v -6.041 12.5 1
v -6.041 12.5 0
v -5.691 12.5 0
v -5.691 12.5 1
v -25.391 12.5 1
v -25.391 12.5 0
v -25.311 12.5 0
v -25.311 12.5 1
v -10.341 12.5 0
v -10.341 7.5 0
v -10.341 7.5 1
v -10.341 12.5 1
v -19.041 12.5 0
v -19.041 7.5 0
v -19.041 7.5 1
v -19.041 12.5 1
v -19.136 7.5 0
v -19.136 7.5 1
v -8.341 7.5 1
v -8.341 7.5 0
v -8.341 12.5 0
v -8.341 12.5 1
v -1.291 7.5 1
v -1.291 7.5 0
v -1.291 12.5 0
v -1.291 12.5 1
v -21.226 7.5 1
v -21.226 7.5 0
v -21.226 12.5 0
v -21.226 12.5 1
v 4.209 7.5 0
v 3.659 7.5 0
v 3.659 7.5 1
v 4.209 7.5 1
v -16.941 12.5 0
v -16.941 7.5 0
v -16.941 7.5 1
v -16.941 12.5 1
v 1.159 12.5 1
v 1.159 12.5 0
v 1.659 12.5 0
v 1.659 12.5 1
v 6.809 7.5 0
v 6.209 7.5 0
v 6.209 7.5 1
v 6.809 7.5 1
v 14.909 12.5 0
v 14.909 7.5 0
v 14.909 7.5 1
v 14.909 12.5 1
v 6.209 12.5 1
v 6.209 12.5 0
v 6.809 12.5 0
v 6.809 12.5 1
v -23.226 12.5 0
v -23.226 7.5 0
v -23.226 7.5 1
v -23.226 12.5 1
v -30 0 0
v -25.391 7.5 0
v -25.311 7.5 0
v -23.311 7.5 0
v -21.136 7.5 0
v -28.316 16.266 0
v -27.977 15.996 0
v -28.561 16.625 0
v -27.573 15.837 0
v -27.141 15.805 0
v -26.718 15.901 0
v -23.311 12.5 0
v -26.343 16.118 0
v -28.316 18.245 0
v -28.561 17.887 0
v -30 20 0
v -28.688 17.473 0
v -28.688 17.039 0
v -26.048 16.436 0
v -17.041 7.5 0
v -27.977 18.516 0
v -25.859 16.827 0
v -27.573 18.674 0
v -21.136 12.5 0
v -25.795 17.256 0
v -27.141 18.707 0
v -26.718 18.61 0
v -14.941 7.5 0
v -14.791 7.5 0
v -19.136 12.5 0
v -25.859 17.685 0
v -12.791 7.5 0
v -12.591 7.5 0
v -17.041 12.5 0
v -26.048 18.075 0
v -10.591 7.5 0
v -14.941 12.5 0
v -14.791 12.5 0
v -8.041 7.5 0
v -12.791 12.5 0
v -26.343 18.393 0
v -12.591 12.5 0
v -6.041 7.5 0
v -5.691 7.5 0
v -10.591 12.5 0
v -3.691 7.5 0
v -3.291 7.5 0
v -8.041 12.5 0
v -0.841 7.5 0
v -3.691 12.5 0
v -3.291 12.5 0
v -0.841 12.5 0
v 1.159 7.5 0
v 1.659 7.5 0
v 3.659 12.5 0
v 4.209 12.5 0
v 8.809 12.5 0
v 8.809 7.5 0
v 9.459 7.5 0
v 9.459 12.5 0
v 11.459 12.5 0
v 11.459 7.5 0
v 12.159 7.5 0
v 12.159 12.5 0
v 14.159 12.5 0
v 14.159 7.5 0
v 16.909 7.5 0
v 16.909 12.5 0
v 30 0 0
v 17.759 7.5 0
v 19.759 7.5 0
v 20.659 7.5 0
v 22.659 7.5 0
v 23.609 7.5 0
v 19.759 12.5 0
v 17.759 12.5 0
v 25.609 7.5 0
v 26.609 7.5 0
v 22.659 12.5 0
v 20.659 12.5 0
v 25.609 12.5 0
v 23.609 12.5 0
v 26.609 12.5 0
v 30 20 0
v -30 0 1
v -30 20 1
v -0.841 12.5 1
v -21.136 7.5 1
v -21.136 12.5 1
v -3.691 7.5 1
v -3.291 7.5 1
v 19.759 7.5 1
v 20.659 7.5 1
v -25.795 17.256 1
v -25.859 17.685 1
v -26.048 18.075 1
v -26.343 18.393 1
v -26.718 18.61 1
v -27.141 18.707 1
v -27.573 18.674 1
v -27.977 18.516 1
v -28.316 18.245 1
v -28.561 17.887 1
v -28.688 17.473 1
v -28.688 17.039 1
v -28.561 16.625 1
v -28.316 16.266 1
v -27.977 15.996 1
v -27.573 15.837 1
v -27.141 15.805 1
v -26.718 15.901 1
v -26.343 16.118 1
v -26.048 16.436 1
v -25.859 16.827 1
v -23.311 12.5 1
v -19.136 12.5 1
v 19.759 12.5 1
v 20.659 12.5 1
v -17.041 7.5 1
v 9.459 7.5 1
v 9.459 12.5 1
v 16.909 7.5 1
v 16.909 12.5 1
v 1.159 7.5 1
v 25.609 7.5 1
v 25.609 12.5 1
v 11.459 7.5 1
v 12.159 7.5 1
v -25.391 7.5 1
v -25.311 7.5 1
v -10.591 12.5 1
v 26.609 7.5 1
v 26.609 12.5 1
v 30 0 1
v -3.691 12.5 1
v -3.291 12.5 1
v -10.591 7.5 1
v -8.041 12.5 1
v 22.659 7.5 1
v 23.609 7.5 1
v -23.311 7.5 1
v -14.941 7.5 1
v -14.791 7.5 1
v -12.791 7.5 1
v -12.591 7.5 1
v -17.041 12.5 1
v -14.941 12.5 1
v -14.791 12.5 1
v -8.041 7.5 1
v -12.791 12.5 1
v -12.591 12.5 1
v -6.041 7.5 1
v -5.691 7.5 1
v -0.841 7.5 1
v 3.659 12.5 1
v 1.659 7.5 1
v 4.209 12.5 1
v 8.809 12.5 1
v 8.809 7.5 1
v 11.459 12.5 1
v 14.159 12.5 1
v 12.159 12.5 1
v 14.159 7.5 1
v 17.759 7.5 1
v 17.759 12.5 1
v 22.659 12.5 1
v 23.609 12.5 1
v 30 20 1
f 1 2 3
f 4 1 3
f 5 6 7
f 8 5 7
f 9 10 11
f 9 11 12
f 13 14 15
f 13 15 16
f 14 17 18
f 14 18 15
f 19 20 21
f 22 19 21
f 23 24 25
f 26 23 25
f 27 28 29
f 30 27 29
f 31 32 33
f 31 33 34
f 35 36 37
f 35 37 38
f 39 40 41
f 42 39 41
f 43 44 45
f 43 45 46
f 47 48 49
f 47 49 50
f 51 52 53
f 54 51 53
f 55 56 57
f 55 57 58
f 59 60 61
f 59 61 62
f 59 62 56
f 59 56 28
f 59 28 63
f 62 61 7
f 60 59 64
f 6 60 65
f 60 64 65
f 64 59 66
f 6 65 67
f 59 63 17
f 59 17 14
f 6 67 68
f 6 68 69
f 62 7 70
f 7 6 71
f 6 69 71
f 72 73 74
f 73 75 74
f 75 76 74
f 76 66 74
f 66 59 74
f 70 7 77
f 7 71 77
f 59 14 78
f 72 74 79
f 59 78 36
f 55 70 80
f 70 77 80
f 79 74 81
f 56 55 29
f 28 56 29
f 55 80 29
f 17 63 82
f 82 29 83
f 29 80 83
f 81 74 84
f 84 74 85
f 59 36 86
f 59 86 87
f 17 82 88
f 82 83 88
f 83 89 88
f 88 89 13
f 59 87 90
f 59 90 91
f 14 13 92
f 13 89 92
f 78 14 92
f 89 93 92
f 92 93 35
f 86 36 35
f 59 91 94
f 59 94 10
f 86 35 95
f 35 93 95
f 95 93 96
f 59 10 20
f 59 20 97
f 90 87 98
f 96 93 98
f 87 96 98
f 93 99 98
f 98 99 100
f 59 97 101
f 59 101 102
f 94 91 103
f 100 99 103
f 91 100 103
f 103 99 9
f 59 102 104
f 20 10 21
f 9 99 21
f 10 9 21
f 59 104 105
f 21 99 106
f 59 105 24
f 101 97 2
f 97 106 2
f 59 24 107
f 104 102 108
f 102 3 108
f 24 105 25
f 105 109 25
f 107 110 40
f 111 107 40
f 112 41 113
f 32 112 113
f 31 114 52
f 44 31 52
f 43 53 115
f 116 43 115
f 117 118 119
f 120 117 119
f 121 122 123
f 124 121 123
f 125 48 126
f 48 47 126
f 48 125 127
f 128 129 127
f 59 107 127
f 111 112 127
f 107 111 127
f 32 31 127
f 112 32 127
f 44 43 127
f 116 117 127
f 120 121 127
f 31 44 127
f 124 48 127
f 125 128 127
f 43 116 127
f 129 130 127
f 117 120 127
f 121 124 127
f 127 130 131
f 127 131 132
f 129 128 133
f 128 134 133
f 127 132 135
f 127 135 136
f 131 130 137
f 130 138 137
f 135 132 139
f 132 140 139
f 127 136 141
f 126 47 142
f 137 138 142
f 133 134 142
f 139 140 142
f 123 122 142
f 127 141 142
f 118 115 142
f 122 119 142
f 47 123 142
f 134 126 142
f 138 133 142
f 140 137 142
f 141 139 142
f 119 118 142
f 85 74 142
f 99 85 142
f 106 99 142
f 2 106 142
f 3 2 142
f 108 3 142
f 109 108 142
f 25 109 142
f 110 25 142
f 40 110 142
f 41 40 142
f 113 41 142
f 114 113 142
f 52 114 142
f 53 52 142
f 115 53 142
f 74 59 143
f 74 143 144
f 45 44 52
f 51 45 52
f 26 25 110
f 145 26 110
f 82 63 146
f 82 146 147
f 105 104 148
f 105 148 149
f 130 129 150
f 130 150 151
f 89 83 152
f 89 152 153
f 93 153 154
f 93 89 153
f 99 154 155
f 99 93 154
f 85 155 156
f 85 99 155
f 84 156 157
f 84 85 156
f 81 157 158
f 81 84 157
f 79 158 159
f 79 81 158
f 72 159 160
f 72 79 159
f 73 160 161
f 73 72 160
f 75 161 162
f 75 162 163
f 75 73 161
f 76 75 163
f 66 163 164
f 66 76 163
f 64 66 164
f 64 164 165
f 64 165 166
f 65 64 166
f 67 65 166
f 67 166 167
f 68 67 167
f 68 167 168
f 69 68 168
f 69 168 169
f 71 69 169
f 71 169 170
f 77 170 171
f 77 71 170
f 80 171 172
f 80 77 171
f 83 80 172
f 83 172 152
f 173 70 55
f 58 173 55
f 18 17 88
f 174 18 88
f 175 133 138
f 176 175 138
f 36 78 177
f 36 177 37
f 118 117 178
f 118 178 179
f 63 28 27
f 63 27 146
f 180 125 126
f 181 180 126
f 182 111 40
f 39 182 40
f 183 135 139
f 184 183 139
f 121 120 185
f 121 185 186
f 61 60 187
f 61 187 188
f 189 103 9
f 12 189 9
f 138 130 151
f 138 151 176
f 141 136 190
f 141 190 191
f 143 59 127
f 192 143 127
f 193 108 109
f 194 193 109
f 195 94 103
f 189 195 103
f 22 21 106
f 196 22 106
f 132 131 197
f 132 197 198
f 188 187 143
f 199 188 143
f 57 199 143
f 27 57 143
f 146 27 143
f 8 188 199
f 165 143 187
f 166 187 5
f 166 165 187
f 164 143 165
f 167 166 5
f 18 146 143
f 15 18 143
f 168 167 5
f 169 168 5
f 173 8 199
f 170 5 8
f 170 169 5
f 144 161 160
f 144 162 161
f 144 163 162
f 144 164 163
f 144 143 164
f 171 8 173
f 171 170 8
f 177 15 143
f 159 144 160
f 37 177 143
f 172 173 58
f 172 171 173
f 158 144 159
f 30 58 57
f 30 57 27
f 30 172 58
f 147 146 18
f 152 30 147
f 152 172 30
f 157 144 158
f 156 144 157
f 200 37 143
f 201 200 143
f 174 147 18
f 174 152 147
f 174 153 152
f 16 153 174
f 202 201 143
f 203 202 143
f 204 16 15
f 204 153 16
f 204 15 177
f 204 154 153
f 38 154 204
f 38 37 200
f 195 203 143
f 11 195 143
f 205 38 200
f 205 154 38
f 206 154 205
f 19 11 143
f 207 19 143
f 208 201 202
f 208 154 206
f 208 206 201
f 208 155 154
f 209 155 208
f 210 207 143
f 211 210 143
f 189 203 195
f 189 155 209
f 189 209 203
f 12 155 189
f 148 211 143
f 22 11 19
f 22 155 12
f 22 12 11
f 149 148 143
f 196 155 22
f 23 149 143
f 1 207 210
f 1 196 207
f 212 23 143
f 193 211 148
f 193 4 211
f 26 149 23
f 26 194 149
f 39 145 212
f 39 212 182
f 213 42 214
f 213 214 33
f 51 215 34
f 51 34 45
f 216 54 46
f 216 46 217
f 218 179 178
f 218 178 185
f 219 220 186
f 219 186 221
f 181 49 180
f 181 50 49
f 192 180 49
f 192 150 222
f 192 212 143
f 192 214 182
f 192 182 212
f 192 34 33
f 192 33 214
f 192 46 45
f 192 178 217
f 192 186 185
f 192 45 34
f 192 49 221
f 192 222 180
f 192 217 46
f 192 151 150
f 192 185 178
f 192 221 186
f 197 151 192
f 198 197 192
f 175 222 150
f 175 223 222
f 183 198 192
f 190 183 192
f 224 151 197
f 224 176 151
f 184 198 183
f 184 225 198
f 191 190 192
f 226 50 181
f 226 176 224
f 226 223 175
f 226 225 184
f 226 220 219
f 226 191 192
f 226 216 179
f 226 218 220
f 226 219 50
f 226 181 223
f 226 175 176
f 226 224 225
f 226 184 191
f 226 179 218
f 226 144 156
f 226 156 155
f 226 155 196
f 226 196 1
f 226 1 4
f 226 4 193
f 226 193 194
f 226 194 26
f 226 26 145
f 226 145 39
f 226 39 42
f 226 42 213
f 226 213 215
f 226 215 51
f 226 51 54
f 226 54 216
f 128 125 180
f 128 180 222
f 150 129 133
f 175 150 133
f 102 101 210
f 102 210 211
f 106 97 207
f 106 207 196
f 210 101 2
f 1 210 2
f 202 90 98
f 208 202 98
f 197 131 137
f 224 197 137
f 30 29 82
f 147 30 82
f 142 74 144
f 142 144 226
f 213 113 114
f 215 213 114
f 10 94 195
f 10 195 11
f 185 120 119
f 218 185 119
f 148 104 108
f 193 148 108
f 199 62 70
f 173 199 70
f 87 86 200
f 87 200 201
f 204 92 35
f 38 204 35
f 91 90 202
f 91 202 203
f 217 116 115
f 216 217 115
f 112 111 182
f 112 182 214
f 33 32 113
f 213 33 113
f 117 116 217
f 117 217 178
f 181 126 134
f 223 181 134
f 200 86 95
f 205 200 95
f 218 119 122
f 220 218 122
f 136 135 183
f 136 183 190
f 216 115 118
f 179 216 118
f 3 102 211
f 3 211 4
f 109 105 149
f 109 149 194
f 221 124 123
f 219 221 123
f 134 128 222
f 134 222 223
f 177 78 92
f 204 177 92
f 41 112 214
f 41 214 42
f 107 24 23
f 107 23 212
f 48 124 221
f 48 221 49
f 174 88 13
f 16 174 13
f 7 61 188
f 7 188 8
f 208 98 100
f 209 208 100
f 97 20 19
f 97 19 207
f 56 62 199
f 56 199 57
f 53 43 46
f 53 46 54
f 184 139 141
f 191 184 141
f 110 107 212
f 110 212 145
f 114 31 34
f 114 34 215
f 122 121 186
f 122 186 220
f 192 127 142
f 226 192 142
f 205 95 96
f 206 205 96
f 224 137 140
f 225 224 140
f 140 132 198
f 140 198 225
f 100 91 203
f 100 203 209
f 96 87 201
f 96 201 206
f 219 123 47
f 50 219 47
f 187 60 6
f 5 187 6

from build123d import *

# Parameters (mm, degrees)
SKETCH_W    = 60
SKETCH_H    = 20
SKETCH_R    = 1.454975
SKETCH_W_2  = 0.08
SKETCH_H_2  = 5
SKETCH_W_3  = 0.085
SKETCH_W_4  = 0.09
SKETCH_W_5  = 0.095
SKETCH_W_6  = 0.1
SKETCH_W_7  = 0.15
SKETCH_W_8  = 0.2
SKETCH_W_9  = 0.25
SKETCH_W_10 = 0.3
SKETCH_W_11 = 0.35
SKETCH_W_12 = 0.4
SKETCH_W_13 = 0.45
SKETCH_W_14 = 0.5
SKETCH_W_15 = 0.55
SKETCH_W_16 = 0.6
SKETCH_W_17 = 0.65
SKETCH_W_18 = 0.7
SKETCH_W_19 = 0.75
SKETCH_W_20 = 0.85
SKETCH_W_21 = 0.9
SKETCH_W_22 = 0.95
SKETCH_W_23 = 1
PAD_DEPTH   = 1


with BuildPart() as part:
    # Sketch → Pad (new body)
    with BuildSketch(Plane.XY):
        with Locations((0, 10)):
            Rectangle(SKETCH_W, SKETCH_H)
        with Locations((-27.249716, 17.255812)):
            Circle(SKETCH_R, mode=Mode.SUBTRACT)
        with Locations((-25.350953, 10)):
            Rectangle(SKETCH_W_2, SKETCH_H_2, mode=Mode.SUBTRACT)
        with Locations((-23.268453, 10)):
            Rectangle(SKETCH_W_3, SKETCH_H_2, mode=Mode.SUBTRACT)
        with Locations((-21.180953, 10)):
            Rectangle(SKETCH_W_4, SKETCH_H_2, mode=Mode.SUBTRACT)
        with Locations((-19.088453, 10)):
            Rectangle(SKETCH_W_5, SKETCH_H_2, mode=Mode.SUBTRACT)
        with Locations((-16.990953, 10)):
            Rectangle(SKETCH_W_6, SKETCH_H_2, mode=Mode.SUBTRACT)
        with Locations((-14.865953, 10)):
            Rectangle(SKETCH_W_7, SKETCH_H_2, mode=Mode.SUBTRACT)
        with Locations((-12.690953, 10)):
            Rectangle(SKETCH_W_8, SKETCH_H_2, mode=Mode.SUBTRACT)
        with Locations((-10.465953, 10)):
            Rectangle(SKETCH_W_9, SKETCH_H_2, mode=Mode.SUBTRACT)
        with Locations((-8.190953, 10)):
            Rectangle(SKETCH_W_10, SKETCH_H_2, mode=Mode.SUBTRACT)
        with Locations((-5.865953, 10)):
            Rectangle(SKETCH_W_11, SKETCH_H_2, mode=Mode.SUBTRACT)
        with Locations((-3.490953, 10)):
            Rectangle(SKETCH_W_12, SKETCH_H_2, mode=Mode.SUBTRACT)
        with Locations((-1.065953, 10)):
            Rectangle(SKETCH_W_13, SKETCH_H_2, mode=Mode.SUBTRACT)
        with Locations((1.409047, 10)):
            Rectangle(SKETCH_W_14, SKETCH_H_2, mode=Mode.SUBTRACT)
        with Locations((3.934047, 10)):
            Rectangle(SKETCH_W_15, SKETCH_H_2, mode=Mode.SUBTRACT)
        with Locations((6.509047, 10)):
            Rectangle(SKETCH_W_16, SKETCH_H_2, mode=Mode.SUBTRACT)
        with Locations((9.134047, 10)):
            Rectangle(SKETCH_W_17, SKETCH_H_2, mode=Mode.SUBTRACT)
        with Locations((11.809047, 10)):
            Rectangle(SKETCH_W_18, SKETCH_H_2, mode=Mode.SUBTRACT)
        with Locations((14.534047, 10)):
            Rectangle(SKETCH_W_19, SKETCH_H_2, mode=Mode.SUBTRACT)
        with Locations((17.334047, 10)):
            Rectangle(SKETCH_W_20, SKETCH_H_2, mode=Mode.SUBTRACT)
        with Locations((20.209047, 10)):
            Rectangle(SKETCH_W_21, SKETCH_H_2, mode=Mode.SUBTRACT)
        with Locations((23.134047, 10)):
            Rectangle(SKETCH_W_22, SKETCH_H_2, mode=Mode.SUBTRACT)
        with Locations((26.109047, 10)):
            Rectangle(SKETCH_W_23, SKETCH_H_2, mode=Mode.SUBTRACT)
    extrude(amount=PAD_DEPTH)


solid = part.part
